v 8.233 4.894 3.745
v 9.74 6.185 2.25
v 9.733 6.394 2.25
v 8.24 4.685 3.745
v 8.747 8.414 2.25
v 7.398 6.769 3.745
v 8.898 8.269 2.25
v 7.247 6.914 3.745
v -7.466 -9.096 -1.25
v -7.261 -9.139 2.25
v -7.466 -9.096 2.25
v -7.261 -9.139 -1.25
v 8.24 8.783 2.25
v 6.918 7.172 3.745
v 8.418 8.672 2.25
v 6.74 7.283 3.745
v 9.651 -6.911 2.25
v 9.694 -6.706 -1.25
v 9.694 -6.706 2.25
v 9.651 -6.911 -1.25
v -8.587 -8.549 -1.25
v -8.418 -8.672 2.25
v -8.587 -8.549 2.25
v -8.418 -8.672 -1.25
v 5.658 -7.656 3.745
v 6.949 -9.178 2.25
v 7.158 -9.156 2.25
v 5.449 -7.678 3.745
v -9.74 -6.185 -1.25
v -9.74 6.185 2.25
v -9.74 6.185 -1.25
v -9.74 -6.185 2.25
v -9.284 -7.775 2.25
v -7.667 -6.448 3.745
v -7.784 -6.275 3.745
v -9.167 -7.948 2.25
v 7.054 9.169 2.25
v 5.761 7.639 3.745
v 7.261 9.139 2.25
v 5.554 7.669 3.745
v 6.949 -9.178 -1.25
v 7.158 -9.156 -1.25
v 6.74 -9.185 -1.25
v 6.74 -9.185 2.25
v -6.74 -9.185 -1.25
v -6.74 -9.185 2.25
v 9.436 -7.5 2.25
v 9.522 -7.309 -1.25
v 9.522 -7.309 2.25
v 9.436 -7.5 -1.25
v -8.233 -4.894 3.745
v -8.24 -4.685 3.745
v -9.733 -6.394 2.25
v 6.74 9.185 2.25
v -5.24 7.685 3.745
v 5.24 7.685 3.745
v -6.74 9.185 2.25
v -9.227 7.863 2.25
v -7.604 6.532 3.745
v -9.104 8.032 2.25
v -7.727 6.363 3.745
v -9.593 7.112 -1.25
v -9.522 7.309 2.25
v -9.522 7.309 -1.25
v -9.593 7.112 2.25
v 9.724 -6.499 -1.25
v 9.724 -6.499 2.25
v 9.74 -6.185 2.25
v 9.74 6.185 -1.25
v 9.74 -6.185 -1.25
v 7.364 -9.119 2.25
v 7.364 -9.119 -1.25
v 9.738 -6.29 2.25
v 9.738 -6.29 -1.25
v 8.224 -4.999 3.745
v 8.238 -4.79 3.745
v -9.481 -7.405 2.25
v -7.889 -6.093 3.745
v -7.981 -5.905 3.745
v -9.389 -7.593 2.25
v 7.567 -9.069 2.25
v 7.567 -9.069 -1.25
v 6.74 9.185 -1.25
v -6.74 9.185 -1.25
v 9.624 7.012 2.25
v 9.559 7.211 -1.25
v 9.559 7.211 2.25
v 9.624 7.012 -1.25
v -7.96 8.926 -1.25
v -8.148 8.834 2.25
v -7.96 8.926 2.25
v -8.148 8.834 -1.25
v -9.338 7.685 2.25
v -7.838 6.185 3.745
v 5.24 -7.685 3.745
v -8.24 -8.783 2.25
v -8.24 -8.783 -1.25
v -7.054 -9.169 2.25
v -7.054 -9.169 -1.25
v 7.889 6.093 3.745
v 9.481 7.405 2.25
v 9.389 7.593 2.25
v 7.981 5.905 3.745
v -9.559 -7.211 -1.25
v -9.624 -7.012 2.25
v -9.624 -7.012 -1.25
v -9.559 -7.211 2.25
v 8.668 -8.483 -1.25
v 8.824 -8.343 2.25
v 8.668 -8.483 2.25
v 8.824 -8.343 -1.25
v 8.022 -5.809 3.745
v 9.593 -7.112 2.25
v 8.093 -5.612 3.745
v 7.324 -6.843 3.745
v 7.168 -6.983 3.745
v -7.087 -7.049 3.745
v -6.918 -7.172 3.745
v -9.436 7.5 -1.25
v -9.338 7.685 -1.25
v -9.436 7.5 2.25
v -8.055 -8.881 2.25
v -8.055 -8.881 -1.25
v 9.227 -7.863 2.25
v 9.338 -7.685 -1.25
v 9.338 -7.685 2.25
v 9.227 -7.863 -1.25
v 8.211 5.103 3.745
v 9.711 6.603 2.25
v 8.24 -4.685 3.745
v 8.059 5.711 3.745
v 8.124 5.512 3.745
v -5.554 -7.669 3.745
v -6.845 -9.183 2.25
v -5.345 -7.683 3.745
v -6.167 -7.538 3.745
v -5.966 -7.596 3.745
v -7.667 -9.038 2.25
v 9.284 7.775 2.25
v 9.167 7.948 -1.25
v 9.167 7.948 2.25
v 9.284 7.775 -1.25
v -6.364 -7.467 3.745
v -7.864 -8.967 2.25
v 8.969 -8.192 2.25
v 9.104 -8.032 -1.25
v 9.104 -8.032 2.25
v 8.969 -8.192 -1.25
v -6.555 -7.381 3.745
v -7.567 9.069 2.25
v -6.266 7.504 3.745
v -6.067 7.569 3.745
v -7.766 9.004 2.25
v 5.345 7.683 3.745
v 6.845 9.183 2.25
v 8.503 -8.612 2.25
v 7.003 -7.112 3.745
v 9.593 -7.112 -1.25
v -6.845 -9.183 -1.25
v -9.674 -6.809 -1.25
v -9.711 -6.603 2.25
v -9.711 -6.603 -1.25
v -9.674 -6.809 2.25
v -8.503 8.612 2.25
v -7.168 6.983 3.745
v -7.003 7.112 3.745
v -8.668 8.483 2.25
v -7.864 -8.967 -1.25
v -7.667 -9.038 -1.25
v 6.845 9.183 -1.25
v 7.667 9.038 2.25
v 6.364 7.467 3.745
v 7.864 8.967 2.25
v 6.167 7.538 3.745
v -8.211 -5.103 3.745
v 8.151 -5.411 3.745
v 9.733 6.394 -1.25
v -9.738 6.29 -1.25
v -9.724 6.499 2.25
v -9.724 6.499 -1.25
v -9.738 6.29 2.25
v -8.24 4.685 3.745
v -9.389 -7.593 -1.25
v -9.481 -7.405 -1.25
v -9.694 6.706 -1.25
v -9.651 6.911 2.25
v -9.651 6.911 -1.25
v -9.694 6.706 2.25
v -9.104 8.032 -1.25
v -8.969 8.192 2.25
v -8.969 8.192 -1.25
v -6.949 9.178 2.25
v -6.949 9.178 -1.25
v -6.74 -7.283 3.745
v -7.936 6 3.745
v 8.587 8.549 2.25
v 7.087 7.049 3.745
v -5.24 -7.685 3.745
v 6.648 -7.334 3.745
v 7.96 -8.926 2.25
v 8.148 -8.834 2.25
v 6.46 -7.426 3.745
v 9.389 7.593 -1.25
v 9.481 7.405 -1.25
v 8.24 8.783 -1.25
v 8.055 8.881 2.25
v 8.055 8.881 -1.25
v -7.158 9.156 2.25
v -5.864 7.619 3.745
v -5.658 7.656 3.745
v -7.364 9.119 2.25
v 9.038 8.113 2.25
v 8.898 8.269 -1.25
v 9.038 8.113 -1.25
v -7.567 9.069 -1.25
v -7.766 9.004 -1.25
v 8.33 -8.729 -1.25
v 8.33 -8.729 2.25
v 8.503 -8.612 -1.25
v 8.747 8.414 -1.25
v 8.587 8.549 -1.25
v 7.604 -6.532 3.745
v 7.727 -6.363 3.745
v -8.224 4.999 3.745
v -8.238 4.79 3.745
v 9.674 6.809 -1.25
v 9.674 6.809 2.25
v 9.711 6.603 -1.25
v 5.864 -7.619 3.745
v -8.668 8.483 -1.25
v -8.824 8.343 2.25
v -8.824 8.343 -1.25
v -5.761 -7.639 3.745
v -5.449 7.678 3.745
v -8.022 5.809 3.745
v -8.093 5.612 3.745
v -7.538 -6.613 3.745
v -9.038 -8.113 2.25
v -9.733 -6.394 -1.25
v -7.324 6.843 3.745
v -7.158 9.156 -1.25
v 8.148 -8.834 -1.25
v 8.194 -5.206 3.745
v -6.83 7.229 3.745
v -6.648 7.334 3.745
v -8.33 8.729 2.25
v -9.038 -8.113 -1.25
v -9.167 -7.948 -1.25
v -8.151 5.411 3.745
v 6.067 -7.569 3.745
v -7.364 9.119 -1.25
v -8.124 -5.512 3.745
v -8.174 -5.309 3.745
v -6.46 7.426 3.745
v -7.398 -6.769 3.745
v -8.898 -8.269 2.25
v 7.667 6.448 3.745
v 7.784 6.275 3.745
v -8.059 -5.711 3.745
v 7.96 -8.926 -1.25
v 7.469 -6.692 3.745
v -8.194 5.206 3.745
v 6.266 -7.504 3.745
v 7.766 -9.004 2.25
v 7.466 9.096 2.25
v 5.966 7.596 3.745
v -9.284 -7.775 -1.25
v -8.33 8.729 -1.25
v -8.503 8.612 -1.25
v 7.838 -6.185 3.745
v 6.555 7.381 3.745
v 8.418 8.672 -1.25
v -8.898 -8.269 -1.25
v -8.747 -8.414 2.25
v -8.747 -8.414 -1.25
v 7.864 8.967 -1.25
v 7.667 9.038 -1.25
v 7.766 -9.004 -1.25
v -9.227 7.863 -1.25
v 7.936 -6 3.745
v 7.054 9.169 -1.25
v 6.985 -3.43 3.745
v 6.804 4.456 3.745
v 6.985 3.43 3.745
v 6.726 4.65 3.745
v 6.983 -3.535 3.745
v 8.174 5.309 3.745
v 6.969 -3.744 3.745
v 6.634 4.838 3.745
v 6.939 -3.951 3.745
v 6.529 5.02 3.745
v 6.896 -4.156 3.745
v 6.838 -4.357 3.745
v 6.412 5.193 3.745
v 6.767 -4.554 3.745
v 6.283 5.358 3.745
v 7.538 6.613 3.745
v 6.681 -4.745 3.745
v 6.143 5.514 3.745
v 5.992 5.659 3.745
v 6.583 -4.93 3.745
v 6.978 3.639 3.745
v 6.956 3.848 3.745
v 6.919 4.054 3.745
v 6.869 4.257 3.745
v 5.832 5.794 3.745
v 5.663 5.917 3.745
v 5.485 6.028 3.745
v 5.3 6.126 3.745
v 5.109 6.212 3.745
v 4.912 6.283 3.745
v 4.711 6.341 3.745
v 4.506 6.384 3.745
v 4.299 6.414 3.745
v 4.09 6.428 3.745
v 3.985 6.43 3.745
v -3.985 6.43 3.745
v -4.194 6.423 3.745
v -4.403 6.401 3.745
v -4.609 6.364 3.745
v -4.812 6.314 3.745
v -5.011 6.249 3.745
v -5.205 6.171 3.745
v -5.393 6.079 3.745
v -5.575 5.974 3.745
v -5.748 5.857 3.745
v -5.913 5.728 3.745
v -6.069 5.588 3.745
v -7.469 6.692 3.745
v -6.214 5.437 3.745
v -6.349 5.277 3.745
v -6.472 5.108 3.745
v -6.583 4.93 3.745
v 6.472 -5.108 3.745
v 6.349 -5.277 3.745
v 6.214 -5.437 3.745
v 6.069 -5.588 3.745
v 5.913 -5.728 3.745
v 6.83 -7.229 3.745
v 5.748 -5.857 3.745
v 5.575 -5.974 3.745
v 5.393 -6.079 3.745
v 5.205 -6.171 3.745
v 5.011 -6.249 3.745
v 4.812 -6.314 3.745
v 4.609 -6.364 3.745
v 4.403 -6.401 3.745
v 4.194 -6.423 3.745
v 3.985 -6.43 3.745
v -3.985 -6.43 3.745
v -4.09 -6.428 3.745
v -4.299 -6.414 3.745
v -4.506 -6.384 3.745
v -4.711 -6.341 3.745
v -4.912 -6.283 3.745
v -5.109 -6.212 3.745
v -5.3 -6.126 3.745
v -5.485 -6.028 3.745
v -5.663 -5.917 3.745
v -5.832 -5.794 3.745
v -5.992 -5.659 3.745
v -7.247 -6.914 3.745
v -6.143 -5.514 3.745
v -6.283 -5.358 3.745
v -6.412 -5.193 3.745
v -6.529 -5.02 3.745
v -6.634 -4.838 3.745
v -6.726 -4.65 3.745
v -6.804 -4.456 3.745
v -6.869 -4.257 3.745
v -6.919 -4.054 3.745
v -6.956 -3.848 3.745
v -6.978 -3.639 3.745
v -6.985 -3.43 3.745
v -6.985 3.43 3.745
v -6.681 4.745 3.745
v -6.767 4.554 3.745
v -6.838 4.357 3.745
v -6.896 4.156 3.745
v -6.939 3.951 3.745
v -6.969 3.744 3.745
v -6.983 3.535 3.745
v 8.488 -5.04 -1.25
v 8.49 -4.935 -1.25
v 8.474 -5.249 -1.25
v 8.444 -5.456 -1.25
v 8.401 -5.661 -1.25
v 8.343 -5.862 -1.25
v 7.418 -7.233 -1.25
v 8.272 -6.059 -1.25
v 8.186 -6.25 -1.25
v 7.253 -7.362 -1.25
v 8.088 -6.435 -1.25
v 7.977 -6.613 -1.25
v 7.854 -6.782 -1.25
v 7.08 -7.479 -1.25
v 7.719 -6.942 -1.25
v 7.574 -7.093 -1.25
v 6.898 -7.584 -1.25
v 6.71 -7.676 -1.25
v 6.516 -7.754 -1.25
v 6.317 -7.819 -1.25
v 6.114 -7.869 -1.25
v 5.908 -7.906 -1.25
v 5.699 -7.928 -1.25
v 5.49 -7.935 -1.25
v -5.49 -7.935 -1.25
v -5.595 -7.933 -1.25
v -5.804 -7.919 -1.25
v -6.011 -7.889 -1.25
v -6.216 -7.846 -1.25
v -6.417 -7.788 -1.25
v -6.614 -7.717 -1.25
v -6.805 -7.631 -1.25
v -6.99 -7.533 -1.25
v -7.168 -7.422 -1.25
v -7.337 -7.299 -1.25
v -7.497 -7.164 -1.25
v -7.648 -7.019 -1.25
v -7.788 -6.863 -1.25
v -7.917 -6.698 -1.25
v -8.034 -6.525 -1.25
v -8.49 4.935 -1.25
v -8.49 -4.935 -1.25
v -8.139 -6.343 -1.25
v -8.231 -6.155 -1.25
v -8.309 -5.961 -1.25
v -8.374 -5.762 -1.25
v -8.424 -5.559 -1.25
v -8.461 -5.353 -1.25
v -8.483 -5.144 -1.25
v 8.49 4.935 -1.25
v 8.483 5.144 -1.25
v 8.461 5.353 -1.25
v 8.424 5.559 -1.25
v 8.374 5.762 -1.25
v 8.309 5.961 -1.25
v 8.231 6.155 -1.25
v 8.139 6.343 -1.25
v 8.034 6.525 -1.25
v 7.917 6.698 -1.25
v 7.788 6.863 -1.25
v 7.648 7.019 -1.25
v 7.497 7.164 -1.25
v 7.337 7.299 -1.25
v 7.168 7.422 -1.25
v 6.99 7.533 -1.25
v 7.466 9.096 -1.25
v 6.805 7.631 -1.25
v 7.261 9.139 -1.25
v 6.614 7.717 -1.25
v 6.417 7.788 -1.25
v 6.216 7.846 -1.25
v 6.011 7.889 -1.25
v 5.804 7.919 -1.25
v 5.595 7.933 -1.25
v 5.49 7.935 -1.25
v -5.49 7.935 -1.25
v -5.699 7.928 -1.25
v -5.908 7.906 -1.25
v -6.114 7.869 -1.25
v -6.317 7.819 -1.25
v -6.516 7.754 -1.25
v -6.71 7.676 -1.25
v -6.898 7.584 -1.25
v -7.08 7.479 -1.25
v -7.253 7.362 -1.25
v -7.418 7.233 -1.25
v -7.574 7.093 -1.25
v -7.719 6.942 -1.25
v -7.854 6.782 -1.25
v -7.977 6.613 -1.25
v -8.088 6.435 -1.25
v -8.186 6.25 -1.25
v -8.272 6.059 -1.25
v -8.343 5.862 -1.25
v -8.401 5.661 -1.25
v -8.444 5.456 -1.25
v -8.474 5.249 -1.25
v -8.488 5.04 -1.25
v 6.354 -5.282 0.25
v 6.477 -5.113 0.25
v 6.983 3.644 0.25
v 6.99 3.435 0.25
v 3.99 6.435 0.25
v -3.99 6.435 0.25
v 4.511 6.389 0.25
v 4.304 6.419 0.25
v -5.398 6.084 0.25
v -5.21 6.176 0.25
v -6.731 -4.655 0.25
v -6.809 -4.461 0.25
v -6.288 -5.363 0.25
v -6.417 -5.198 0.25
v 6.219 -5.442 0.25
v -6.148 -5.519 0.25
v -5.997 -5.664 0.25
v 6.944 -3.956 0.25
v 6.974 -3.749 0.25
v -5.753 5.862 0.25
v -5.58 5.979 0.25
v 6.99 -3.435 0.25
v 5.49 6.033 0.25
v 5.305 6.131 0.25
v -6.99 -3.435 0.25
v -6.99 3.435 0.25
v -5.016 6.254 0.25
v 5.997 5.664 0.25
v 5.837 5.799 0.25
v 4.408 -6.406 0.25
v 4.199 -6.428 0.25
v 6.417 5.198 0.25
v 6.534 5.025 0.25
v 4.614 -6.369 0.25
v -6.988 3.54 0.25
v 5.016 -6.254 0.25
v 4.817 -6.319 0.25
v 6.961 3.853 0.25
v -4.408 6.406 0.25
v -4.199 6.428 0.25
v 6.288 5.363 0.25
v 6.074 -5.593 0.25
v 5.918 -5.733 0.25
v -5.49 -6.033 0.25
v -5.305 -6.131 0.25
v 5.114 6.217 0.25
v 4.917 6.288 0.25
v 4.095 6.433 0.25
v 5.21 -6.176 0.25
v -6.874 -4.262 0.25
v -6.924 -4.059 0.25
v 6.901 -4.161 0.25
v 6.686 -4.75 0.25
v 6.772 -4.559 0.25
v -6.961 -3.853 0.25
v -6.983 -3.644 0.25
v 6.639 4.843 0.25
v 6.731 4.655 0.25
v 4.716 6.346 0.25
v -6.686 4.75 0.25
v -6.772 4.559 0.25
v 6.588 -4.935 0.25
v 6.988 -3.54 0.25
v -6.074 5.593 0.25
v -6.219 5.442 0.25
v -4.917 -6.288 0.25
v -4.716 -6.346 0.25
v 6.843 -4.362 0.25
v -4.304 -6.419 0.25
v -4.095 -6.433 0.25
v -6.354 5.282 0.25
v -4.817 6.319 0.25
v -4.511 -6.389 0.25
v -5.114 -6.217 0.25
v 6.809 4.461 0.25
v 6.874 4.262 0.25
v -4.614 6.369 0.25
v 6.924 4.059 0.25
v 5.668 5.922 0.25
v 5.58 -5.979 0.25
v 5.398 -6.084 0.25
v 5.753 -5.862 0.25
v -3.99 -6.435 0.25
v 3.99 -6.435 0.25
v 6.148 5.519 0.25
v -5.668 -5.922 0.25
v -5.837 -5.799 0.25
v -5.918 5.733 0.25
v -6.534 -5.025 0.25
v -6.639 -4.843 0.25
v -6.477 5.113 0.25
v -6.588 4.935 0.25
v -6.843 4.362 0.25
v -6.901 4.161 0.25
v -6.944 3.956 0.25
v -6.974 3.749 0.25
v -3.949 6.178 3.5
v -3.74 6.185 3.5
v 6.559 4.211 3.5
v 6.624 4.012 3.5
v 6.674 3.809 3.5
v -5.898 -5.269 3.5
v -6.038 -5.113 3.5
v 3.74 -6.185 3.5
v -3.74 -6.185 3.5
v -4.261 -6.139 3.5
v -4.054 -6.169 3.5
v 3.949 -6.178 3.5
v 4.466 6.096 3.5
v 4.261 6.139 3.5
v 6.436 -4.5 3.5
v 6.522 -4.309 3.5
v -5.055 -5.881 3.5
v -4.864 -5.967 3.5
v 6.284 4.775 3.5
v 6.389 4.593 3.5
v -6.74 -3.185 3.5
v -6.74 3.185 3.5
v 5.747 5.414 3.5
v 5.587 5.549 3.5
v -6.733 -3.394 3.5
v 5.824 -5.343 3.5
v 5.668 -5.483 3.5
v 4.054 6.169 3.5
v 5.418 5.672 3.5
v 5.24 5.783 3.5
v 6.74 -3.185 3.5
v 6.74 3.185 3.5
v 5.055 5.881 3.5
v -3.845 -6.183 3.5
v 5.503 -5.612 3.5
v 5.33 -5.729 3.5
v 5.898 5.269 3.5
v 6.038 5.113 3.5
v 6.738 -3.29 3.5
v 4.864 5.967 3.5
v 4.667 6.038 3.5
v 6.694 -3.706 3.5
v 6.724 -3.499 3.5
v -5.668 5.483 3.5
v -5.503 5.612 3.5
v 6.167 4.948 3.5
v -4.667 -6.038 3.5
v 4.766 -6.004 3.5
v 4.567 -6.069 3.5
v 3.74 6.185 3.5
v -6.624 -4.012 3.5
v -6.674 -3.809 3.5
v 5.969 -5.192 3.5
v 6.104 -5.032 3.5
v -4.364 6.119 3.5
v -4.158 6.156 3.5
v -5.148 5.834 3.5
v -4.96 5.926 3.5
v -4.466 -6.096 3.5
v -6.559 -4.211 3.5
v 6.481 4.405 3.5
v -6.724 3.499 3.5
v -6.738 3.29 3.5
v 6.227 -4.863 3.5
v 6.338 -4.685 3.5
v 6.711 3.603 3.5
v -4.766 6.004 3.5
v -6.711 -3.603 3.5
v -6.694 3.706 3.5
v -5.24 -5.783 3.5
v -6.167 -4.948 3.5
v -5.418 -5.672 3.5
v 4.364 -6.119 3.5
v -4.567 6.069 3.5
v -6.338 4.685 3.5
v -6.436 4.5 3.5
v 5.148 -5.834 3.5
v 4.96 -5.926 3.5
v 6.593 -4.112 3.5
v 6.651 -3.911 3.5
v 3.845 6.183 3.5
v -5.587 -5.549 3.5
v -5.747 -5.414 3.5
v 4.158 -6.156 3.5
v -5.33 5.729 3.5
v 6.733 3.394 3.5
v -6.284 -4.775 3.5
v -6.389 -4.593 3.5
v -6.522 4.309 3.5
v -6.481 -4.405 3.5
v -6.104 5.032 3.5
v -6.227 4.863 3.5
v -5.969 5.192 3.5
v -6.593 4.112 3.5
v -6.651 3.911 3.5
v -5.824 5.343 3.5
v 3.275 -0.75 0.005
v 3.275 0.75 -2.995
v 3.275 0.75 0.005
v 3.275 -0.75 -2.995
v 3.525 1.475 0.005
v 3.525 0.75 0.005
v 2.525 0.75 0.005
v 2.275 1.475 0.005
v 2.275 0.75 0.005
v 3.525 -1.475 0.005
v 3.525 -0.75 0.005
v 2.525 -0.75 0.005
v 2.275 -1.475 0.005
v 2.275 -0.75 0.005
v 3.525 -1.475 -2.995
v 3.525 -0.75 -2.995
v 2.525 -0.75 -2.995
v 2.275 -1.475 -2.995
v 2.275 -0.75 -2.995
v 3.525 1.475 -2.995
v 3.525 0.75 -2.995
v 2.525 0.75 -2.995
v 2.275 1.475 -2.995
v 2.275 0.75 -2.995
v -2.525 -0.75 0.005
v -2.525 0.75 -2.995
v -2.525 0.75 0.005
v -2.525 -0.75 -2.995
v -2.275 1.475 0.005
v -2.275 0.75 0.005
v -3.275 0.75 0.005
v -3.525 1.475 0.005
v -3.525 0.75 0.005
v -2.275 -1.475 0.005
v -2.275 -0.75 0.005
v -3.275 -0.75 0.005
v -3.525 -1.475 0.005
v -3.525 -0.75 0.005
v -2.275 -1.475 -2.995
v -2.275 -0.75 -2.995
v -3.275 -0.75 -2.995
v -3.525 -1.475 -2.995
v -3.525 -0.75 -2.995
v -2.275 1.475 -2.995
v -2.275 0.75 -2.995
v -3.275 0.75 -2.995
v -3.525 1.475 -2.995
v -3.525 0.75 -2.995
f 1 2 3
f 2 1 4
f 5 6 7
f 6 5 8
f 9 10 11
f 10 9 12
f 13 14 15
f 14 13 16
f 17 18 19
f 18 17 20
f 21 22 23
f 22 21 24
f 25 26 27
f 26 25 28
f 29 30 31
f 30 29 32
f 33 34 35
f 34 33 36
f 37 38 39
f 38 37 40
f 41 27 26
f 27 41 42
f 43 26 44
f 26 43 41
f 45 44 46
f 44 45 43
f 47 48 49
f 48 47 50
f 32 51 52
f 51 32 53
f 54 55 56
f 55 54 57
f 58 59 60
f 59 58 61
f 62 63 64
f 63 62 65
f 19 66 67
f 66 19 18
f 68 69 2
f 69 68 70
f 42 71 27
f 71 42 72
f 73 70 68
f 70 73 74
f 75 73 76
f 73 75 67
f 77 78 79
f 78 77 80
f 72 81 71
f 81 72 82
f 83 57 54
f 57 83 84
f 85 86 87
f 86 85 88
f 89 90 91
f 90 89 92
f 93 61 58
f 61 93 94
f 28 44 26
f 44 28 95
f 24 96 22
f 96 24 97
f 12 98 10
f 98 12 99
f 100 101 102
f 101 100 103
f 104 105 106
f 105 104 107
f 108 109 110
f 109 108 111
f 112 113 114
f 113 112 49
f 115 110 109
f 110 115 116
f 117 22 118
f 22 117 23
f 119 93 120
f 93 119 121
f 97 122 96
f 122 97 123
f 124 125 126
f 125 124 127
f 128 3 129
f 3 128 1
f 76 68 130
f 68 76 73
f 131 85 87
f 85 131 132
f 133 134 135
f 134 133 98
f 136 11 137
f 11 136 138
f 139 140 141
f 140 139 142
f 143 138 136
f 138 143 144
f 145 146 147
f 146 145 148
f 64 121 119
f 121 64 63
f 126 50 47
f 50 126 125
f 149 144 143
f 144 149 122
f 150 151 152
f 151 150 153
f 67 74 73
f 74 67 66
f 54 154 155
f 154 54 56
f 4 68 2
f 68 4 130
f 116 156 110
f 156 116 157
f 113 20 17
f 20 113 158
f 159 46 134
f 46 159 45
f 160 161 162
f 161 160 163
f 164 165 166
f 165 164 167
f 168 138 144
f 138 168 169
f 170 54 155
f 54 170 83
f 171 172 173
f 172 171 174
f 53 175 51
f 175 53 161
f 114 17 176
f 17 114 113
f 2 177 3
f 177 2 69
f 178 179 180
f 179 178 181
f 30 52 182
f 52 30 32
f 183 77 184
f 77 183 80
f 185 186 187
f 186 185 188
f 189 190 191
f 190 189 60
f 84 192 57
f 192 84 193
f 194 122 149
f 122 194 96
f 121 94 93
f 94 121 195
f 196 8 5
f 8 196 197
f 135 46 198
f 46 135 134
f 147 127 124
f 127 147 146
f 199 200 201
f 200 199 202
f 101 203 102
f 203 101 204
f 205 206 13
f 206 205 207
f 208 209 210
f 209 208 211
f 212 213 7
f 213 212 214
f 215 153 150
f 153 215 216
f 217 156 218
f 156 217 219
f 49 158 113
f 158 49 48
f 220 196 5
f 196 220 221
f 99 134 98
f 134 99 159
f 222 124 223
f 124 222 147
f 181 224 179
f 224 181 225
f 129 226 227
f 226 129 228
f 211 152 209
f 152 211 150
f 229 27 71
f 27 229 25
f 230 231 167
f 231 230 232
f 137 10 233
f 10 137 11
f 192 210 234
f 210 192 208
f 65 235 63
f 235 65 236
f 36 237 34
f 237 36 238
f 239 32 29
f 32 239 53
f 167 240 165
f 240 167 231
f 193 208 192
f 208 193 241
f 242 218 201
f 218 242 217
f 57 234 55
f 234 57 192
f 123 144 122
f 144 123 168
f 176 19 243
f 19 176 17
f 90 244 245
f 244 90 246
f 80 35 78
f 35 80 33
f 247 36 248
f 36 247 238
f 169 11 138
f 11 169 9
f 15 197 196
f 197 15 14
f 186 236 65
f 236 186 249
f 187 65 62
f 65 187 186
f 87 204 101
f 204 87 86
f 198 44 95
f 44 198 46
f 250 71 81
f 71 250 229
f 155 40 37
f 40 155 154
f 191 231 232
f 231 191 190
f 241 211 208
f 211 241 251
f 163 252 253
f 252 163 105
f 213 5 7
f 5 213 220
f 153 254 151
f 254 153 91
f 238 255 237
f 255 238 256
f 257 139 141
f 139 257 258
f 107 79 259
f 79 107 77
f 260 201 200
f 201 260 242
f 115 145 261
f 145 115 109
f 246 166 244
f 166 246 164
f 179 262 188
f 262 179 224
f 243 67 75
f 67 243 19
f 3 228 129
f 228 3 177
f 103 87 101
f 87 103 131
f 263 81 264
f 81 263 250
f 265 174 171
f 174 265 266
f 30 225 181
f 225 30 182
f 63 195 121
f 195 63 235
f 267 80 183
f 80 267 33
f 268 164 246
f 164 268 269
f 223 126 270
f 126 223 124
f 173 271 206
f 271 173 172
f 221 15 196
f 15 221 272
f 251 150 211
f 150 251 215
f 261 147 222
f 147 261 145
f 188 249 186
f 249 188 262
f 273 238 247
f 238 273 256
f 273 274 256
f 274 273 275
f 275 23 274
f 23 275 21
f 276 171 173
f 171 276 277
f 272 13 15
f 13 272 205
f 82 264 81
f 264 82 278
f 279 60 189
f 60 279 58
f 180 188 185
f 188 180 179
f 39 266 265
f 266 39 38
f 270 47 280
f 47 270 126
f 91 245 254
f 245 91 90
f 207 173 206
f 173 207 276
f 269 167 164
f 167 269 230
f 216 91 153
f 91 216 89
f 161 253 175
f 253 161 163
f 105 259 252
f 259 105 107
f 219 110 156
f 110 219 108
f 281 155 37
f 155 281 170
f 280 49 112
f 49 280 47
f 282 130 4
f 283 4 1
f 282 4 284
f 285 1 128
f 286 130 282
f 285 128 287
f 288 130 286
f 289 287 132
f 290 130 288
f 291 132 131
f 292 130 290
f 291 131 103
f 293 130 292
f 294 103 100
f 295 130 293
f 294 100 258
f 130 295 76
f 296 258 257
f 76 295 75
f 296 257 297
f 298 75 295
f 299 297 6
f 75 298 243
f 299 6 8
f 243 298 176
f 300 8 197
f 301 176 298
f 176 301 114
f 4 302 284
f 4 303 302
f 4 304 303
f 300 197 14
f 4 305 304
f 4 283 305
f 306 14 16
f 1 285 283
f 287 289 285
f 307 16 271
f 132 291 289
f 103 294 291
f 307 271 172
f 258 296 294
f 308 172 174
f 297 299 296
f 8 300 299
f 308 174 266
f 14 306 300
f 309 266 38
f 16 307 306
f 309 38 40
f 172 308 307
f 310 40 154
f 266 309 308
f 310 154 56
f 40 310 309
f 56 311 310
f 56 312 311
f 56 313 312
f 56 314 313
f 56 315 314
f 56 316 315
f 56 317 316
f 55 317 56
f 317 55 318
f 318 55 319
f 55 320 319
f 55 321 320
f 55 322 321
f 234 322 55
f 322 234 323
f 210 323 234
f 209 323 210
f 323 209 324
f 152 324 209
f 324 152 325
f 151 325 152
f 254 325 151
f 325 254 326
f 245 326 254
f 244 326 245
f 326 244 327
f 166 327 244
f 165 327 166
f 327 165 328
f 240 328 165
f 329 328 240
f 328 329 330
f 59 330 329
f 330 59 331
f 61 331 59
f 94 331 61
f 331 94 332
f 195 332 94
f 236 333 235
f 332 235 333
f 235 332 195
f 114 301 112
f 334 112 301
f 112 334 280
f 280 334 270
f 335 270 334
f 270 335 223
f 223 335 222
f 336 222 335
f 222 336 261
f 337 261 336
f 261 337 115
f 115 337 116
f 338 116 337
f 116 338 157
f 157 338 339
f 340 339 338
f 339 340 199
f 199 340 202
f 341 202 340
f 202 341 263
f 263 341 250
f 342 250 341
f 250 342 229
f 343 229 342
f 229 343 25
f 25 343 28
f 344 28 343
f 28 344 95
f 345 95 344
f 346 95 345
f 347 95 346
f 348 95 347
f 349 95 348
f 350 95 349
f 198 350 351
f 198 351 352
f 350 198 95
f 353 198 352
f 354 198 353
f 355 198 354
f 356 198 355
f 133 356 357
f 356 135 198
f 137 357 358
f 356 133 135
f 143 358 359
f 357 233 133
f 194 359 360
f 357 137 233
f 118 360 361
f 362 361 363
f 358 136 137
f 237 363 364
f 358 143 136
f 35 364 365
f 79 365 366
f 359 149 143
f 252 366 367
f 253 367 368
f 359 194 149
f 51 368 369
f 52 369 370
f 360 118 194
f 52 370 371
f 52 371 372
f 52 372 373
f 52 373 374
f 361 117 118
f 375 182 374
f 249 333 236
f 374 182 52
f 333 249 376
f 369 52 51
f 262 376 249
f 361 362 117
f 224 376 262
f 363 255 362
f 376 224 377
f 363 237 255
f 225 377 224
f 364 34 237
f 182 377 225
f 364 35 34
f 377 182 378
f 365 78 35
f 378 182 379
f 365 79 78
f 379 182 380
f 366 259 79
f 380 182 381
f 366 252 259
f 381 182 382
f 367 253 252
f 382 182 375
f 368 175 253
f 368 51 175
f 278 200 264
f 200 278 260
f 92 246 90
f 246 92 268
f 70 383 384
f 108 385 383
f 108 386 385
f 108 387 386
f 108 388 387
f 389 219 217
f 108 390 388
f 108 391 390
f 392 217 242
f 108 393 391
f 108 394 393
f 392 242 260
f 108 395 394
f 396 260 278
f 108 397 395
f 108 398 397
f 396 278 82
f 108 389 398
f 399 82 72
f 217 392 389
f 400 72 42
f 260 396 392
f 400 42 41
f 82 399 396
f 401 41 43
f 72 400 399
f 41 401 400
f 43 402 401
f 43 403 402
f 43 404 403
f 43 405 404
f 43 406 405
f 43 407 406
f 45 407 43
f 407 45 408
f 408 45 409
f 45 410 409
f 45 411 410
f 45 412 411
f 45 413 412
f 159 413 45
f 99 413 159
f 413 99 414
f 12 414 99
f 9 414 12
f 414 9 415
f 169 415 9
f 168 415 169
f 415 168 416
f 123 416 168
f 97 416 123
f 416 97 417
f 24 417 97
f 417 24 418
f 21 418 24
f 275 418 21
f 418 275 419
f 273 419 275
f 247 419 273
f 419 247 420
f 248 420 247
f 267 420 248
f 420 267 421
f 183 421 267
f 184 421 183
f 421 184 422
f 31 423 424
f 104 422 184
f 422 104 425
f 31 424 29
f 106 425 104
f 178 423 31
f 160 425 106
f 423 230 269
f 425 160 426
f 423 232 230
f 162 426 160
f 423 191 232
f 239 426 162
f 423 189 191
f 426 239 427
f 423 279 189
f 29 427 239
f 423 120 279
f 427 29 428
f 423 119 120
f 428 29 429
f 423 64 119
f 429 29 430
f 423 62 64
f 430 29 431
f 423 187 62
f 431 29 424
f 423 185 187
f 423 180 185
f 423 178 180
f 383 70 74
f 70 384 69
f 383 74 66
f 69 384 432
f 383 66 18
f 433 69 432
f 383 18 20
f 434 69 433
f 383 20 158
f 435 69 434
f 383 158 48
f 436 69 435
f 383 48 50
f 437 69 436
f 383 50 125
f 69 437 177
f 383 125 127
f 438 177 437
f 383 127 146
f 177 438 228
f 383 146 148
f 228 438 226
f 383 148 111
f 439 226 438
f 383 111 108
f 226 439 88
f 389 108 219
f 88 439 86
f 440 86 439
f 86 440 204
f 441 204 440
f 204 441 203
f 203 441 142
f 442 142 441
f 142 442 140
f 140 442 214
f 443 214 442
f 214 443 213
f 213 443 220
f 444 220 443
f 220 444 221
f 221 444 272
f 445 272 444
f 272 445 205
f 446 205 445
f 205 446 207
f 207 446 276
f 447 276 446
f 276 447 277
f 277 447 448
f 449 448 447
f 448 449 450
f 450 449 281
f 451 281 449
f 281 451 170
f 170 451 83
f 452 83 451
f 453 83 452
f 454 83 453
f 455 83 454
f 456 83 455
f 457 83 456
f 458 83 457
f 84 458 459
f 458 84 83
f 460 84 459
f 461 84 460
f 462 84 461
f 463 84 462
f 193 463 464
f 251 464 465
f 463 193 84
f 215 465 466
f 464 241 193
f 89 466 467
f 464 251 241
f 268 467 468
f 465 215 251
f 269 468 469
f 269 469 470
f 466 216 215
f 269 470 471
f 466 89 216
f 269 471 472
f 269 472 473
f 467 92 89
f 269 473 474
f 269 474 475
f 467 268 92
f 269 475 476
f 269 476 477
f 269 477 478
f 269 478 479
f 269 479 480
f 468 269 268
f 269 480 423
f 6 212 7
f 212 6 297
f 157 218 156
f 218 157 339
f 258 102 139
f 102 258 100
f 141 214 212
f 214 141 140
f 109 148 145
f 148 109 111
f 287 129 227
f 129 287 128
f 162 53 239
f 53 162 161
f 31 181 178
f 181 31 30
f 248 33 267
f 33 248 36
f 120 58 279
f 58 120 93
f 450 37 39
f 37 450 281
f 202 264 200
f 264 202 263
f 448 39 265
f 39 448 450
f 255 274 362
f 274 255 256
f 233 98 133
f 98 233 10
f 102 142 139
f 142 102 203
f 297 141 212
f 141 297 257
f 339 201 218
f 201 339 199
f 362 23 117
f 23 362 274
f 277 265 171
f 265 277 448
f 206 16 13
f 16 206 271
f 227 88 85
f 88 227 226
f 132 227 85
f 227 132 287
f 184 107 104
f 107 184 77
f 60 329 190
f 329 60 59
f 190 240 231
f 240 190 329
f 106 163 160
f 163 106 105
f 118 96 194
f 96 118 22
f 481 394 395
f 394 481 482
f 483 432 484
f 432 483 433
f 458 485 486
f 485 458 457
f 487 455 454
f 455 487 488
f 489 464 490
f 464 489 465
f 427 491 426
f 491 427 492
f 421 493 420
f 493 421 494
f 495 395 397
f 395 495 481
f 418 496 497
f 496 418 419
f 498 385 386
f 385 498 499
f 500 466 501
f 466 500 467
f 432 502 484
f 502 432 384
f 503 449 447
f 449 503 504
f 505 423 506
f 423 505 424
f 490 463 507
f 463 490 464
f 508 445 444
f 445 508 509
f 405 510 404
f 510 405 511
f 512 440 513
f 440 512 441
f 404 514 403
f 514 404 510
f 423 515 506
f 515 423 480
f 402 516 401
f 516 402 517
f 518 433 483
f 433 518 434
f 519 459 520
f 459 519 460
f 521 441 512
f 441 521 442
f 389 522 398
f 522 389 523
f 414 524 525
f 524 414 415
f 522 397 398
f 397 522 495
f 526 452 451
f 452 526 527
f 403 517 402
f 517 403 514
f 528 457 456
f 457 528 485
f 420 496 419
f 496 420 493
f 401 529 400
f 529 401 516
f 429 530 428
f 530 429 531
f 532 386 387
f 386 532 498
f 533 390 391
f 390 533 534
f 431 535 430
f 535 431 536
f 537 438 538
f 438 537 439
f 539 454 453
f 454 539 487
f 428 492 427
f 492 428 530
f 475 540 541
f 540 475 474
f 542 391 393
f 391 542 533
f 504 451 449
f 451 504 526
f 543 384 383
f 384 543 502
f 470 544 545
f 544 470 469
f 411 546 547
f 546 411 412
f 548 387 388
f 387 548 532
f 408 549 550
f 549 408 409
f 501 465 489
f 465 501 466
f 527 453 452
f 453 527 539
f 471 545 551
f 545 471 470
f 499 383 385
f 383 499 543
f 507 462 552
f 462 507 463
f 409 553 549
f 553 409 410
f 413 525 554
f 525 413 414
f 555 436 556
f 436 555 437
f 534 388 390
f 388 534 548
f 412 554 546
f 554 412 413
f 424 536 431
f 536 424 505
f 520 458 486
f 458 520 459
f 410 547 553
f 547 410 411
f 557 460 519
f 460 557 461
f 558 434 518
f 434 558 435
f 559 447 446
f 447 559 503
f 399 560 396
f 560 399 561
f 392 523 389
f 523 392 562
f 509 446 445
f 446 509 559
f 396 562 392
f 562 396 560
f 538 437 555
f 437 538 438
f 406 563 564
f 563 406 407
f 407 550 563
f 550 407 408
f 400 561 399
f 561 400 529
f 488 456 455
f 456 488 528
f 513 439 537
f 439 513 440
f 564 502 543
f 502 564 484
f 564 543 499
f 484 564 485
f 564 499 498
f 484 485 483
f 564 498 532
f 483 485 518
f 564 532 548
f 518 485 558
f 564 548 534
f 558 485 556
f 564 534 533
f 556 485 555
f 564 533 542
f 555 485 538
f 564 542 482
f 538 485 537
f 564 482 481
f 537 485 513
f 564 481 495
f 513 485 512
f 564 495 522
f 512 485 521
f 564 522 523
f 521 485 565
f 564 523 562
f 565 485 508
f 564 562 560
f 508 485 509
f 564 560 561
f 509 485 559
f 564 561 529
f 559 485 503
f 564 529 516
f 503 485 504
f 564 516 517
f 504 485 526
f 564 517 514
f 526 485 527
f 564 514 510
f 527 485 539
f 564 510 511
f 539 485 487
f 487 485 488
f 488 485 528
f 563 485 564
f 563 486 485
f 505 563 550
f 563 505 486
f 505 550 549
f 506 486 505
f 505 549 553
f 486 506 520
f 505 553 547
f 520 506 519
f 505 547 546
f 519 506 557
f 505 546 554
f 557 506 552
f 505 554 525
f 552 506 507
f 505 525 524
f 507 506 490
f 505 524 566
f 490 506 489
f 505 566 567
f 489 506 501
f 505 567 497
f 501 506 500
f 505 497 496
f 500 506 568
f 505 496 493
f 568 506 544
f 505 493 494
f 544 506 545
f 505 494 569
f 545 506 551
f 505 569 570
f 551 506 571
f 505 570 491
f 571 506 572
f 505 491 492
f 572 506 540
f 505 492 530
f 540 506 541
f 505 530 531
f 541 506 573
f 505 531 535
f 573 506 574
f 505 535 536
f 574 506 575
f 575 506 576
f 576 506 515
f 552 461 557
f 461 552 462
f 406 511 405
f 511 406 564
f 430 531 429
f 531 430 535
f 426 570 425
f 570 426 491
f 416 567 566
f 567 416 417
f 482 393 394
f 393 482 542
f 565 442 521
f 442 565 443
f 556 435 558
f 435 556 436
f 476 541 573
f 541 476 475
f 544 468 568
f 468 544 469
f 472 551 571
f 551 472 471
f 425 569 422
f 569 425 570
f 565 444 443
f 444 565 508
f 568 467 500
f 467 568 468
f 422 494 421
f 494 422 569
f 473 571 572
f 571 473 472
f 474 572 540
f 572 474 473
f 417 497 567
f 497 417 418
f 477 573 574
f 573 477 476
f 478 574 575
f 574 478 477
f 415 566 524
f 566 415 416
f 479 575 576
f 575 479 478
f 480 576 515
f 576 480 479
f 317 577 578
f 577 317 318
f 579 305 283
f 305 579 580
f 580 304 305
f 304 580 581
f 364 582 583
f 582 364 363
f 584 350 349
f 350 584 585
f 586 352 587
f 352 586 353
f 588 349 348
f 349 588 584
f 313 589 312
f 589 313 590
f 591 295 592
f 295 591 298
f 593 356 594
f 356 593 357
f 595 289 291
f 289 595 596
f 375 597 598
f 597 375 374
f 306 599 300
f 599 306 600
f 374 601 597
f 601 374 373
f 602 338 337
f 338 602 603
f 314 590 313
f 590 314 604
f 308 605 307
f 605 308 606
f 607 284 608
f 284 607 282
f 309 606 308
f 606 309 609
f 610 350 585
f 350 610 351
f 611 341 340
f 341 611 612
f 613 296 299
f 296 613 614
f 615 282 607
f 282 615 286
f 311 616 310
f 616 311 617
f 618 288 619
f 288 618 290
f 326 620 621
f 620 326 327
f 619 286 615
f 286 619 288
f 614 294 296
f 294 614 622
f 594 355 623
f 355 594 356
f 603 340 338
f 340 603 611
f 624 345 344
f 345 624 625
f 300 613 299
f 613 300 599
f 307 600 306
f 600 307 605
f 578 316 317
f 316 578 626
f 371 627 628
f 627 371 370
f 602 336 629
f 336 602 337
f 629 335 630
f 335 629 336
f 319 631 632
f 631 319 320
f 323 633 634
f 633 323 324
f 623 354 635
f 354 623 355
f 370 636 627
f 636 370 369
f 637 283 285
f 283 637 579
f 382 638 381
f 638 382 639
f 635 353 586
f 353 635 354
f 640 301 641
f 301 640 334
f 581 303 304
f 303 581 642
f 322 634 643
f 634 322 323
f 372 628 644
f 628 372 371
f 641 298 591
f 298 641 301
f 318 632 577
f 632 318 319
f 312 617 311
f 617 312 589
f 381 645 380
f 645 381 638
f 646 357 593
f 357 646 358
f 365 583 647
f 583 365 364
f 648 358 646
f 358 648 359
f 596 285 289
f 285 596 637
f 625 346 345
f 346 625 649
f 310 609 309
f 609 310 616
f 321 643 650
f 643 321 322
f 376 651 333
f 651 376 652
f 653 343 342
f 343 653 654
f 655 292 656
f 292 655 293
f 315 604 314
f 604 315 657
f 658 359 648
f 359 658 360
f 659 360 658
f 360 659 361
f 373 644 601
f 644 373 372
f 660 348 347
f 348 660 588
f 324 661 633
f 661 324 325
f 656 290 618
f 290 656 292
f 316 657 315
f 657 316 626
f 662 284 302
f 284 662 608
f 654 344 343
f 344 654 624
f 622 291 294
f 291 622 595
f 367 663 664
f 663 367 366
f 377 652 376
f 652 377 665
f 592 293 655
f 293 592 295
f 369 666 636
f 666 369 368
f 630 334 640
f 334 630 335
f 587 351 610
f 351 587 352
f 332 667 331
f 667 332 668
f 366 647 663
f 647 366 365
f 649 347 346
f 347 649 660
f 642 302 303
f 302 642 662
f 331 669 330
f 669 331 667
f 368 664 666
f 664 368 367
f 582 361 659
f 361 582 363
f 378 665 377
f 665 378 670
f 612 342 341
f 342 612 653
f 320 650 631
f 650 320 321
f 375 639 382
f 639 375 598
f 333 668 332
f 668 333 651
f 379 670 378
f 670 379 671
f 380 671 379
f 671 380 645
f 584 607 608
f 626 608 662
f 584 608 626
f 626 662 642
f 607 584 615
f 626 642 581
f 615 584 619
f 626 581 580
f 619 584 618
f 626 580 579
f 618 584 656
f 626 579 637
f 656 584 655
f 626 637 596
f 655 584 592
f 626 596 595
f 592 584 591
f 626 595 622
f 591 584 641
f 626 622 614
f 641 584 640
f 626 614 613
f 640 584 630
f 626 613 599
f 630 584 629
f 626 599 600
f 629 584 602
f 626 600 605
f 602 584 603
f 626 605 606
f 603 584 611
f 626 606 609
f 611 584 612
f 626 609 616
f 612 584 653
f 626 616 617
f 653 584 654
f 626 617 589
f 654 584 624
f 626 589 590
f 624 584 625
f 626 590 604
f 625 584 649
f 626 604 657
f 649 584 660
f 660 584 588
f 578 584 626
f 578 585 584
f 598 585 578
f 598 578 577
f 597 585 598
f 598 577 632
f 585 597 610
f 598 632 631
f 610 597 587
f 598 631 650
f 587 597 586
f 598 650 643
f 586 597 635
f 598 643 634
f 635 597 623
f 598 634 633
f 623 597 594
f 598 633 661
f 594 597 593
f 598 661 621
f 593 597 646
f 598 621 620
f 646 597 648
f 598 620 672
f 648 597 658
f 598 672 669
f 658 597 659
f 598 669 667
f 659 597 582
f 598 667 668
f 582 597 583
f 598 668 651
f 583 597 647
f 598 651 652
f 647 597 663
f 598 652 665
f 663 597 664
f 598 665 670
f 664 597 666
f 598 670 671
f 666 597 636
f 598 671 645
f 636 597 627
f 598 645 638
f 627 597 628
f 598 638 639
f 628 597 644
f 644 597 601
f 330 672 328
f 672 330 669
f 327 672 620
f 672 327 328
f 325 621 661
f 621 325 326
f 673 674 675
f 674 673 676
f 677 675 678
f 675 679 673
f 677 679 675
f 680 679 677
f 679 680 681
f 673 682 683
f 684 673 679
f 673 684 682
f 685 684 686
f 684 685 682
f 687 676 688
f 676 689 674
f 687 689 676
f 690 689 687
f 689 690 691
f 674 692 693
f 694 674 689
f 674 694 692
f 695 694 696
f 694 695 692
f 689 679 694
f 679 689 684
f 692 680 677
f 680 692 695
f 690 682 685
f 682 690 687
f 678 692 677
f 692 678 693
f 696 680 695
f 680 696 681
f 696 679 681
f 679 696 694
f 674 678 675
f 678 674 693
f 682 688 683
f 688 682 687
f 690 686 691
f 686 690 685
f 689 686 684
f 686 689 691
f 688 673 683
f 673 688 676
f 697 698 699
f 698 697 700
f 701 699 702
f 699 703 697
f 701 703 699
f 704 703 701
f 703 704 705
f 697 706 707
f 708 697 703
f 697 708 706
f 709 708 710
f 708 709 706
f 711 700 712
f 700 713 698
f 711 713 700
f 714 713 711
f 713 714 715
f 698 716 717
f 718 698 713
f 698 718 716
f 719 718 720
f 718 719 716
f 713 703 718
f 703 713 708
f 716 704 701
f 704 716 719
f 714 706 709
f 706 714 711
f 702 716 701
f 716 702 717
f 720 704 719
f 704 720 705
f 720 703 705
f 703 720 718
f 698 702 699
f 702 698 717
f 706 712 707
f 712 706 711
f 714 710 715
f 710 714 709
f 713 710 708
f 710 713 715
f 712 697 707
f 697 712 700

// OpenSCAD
// file: ../modules/breakPart.scad
module rotFromTo(di,do)
    if( norm(di-do)==0 || norm(di)==0 || norm(do)==0 )
        children();
    else
        mirror(do/norm(do)+di/norm(di)) mirror(di) children(); 

module breakPart(normal = [0, 0, 0], shift=0, pinLocs = [[0, 0]], pinType = 0) {
  // First child is the part itself, second child is the pin
  //   - The pin should be centered in x and y and into the positive z direction
  // normal: Vector normal to the plane of breaking
  // shift: How far from the origin to move the center of the plane
  // pinOffset: Offset for pin (hole -> wider, pin -> narrower)
  // pinType: [0: attached (M), 1: F]
  _BIG = 250;

  difference() {
    children(0);
    rotFromTo([0, 0, 1], normal) translate([0, 0, shift]) {
      difference() {
        cylinder(r = _BIG/2, h = _BIG);
        if (pinType == 0) for (loc = pinLocs) {
          translate(concat(loc, [shift - eps])) {
            children(1);
          }
        }
      }
      if (pinType == 1) for (loc = pinLocs) {
        mirror([0, 0, 1]) translate(concat(loc, [shift - eps])) {
          children(1);
        }
      }
    } 
  }

}
// file: ../_constants.scad
$fa=4 + 0; // default minimum facet angle is now 0.5
$fs=0.1 + 0; // default minimum facet size is now 0.05 mm
eps = .005 + 0;

defaultFont = "Bitstream Vera Sans Mono:style=Bold";

include <modules/breakPart.scad>;
// main file
include <../_constants.scad>

ux = 1.11;
uy = 1.11;
dish = true;
support = true;

/* Post Dimensions */
d1 = 0 + 1.25;
d2 = 0 + 0.75;

dGap = 0 + 4.55;
ctrToCtr = dGap + d1;

h1 = 0 + 2.95;
h2 = 0 + 0.725;

l1 = 0 + 3;

/*Keycap Dimensions*/
xUnit = 18 + 0;
yUnit = 17 + 0;

cornerRadius = 0 + 3;
keySpacing = 0 + .5;
chamfer = 0 + 1.5;
height = 0 + 2;

dishDepth = 0 + .25;
dishInset = 0 + 1.25;

/* Computed */
xLen = (xUnit * ux) - keySpacing;
yLen = (yUnit * uy) - keySpacing;

module keyCap() {
  translate([0, 0, height / 2 - chamfer/2]) difference() {
    hull() {
      translate([0, 0, -chamfer]) linear_extrude(eps) offset(cornerRadius) square([xLen - cornerRadius*2, yLen - cornerRadius*2], center=true);
      translate([0, 0, height - eps]) linear_extrude(eps) offset(cornerRadius) square([xLen - cornerRadius*2, yLen - cornerRadius*2], center=true);
      translate([0, 0, height + chamfer - eps * 2]) linear_extrude(eps) offset(cornerRadius) square([xLen - cornerRadius*2 - chamfer*2, yLen - cornerRadius*2 - chamfer*2], center=true);
    }
    hull() {
      translate([0, 0, -chamfer - eps]) linear_extrude(eps) offset(cornerRadius) square([xLen - cornerRadius*2 - dishInset*2, yLen - cornerRadius*2 - dishInset*2], center=true);
      translate([0, 0, -eps]) linear_extrude(eps) offset(cornerRadius) square([xLen - cornerRadius*2 - dishInset*2 - chamfer*2, yLen - cornerRadius*2 - dishInset*2 - chamfer*2], center=true);
    }
    if (dish) {
      hull() {
        translate([0, 0, height + chamfer - dishDepth]) linear_extrude(eps) offset(cornerRadius) square([xLen - cornerRadius*2 - chamfer*2 - dishInset*2 - dishDepth*2, yLen - cornerRadius*2 - chamfer*2 - dishInset*2 - dishDepth*2], center=true);
        translate([0, 0, height + chamfer]) linear_extrude(eps) offset(cornerRadius) square([xLen - cornerRadius*2 - chamfer*2 - dishInset*2, yLen - cornerRadius*2 - chamfer*2 - dishInset*2], center=true);
      }
    }
  }
}

module post(x = 0, y = 0, z = 0) {
  translate([x, y, z - l1/2]) {
    cube([d2, h1, l1], center = true);
    translate([0, h1/2 - h2/2, 0]) cube([d1, h2, l1], center=true);
    translate([0, -h1/2 + h2/2, 0]) cube([d1, h2, l1], center=true);
  }
}

module fullKeyCap() {
  keyCap();
  post(x = ctrToCtr/2, z=eps);
  post(x = -ctrToCtr/2, z=eps);
}

module supportBlock() {

}

fullKeyCap();
#if (support) supportBlock();


// /* Post Dimensions */
// d1 = 0 + 1.25;
// d2 = 0 + 0.75;

// dGap = 0 + 4.55;
// ctrToCtr = dGap + d1;

// h1 = 0 + 2.95;
// h2 = 0 + 0.725;

// l1 = 0 + 2.5;

// /* Keycap Dimensions */
// unit = 0 + 17;
// edgeGap = 0 + .25;
// radius = 0 + 1.25;
// thickness = 0 + 2.5;

// chamferBottom = 0 + 0.75;
// chamferTop = 0 + 0.75;

// dishInset = 0 + 0.5;
// dishDepth = 0 + 0.25;

// /* Support Block */
// supportHeight = 0 + 5;
// supportOffset = 0 + 1;
// tipContactRad = 0 + 0.2;
// supportSpacing = 0 + 1;

// /* Configuration */
// dish = true; // Whether or not to include the dish element;
// unitX = 1.25; // Units in length
// unitY = 1.25; // Units in height

// xDim = (unitX * unit) - 2*edgeGap;
// yDim = (unitY * unit) - 2*edgeGap;

// supportBrick = true;
// supportTool = false;

// module post(x = 0, y = 0, z = 0) {
//   translate([x, y, z - l1/2]) {
//     cube([d2, h1, l1], center = true);
//     translate([0, h1/2 - h2/2, 0]) cube([d1, h2, l1], center=true);
//     translate([0, -h1/2 + h2/2, 0]) cube([d1, h2, l1], center=true);
//   }
// }

// module keyCap(x = 0, y = 0, z = 0) {
//   t1 = thickness - chamferBottom - chamferTop;

//   x1 = xDim - 2*radius;
//   y1 = yDim - 2*radius;

//   x2 = x1 - 2*chamferBottom;
//   y2 = y1 - 2*chamferBottom;

//   x3 = x1 - 2*chamferTop;
//   y3 = y1 - 2*chamferTop;

//   x4 = x3 - 2*dishInset;
//   y4 = y3 - 2*dishInset;

//   x5 = x4 - 2*dishDepth;
//   y5 = y4 - 2*dishDepth;
//   translate([x, y, z + thickness / 2]) difference() {
//     hull() {
//       translate([0, 0, -thickness/2 + chamferBottom]) linear_extrude(t1) offset(radius) square([x1, y1], center = true);
//       translate([0, 0, -thickness / 2]) linear_extrude(eps) offset(radius) square([x2, y2], center=true);
//       translate([0, 0, thickness / 2 - eps]) linear_extrude(eps) offset(radius) square([x3, y3], center=true);
//     }
//     if (dish) {
//       translate([0, 0, thickness / 2 - dishDepth]) hull() {
//         translate([0, 0, dishDepth]) linear_extrude(eps) offset(radius) square([x4, y4], center=true);
//         linear_extrude(eps) offset(radius) square([x5, y5], center=true);
//       }
//     }
//   }
// }

// module fullKeyCap() {
//   keyCap();
//   post(x = ctrToCtr/2, z=eps);
//   post(x = -ctrToCtr/2, z=eps);
// }

// module attachmentPoint() {
//   translate([0, 0, -eps]) cylinder(r1 = supportSpacing / 2, r2 = tipContactRad, h=supportOffset + eps);
// }

// x1 = xDim - 2*radius - chamferBottom*2;
// y1 = yDim - 2*radius - chamferBottom*2;

// if (supportTool) translate([0, 0, -supportHeight]) {
//   for (x = [-x1/3, x1/3]) for (y = [-y1/3, y1/3]) {
//     translate([x, y, 0]) cylinder(r = 1.25, h = supportHeight);
//     translate([x, y, supportHeight]) sphere(r=1.25);
//   }
//   cylinder(r = 1.25, h = supportHeight);
//   translate([0, 0, supportHeight]) sphere(r=1.25);
//   translate([0, 0, -supportHeight/3 + eps]) hull() {
//     linear_extrude(eps) offset(radius) square([x1, y1], center=true);
//     translate([0, 0, supportHeight/3 - eps]) linear_extrude(eps) offset(radius) square([xDim, yDim], center=true);
//   }
// } else union() {
//   fullKeyCap();

//   if (supportBrick) {

//     difference() {
//       union() {
//         translate([0, 0, -supportHeight]) hull() {
//           linear_extrude(eps) offset(radius) square([x1, y1], center=true);
//           translate([0, 0, supportHeight - supportOffset]) linear_extrude(eps) offset(radius) square([x1, yDim + 2.5], center=true);
//         }
//       }

//       for (xC = [-ctrToCtr/2, ctrToCtr/2]) {
//         translate([xC, 0, -l1 - supportOffset]) cylinder(r=h1 * .65, h = l1 + supportOffset + eps);
//       }

//       cylinder(r = 1.5, h = 25, center = true);
//       for (x = [-x1/3, x1/3]) for (y = [-y1/3, y1/3]) {
//           translate([x, y, 0]) cylinder(r = 1.5, h = 25, center = true);
//       }
//     }

//     //Attachment points
//     union() {
//       ax = xDim - .75 - 2*radius;
//       ay = yDim - .75 - 2*radius;

//       for(x=[-d1/2, d1/2]) for (y=[-h1/2, h1/2, h1/2-h2, -h1/2+h2]) for(xC=[-ctrToCtr/2, ctrToCtr/2]) translate([x +xC, y, -l1 - supportOffset]) attachmentPoint();

//       for(x=[-ax/2+supportSpacing:supportSpacing:ax/2-supportSpacing]) for(y=[-ay/2,-h1*.75,h1*.75,ay/2]) translate([x, y, -supportOffset]) attachmentPoint();
//       for(x=[-ax/5:supportSpacing:ax/5]) for(y=[-ay/3 + 1,ay/3 + 1,-ay/3 - 1,ay/3 - 1]) translate([x, y, -supportOffset]) attachmentPoint();
//       for(x=[-ax/2,ax/2]) for(y=[-ay/2:supportSpacing:ay/2]) translate([x, y, -supportOffset]) attachmentPoint();
//     }
//   }
// }

// /* Support Removal Tool */
// // !difference() {
// //   cube([unit + 12, unit * 1.5, 12], center=true);
// //   translate([0, 0, 4]) cube([unit + .5, unit *1.5 + eps, 12], center=true);
// // }
